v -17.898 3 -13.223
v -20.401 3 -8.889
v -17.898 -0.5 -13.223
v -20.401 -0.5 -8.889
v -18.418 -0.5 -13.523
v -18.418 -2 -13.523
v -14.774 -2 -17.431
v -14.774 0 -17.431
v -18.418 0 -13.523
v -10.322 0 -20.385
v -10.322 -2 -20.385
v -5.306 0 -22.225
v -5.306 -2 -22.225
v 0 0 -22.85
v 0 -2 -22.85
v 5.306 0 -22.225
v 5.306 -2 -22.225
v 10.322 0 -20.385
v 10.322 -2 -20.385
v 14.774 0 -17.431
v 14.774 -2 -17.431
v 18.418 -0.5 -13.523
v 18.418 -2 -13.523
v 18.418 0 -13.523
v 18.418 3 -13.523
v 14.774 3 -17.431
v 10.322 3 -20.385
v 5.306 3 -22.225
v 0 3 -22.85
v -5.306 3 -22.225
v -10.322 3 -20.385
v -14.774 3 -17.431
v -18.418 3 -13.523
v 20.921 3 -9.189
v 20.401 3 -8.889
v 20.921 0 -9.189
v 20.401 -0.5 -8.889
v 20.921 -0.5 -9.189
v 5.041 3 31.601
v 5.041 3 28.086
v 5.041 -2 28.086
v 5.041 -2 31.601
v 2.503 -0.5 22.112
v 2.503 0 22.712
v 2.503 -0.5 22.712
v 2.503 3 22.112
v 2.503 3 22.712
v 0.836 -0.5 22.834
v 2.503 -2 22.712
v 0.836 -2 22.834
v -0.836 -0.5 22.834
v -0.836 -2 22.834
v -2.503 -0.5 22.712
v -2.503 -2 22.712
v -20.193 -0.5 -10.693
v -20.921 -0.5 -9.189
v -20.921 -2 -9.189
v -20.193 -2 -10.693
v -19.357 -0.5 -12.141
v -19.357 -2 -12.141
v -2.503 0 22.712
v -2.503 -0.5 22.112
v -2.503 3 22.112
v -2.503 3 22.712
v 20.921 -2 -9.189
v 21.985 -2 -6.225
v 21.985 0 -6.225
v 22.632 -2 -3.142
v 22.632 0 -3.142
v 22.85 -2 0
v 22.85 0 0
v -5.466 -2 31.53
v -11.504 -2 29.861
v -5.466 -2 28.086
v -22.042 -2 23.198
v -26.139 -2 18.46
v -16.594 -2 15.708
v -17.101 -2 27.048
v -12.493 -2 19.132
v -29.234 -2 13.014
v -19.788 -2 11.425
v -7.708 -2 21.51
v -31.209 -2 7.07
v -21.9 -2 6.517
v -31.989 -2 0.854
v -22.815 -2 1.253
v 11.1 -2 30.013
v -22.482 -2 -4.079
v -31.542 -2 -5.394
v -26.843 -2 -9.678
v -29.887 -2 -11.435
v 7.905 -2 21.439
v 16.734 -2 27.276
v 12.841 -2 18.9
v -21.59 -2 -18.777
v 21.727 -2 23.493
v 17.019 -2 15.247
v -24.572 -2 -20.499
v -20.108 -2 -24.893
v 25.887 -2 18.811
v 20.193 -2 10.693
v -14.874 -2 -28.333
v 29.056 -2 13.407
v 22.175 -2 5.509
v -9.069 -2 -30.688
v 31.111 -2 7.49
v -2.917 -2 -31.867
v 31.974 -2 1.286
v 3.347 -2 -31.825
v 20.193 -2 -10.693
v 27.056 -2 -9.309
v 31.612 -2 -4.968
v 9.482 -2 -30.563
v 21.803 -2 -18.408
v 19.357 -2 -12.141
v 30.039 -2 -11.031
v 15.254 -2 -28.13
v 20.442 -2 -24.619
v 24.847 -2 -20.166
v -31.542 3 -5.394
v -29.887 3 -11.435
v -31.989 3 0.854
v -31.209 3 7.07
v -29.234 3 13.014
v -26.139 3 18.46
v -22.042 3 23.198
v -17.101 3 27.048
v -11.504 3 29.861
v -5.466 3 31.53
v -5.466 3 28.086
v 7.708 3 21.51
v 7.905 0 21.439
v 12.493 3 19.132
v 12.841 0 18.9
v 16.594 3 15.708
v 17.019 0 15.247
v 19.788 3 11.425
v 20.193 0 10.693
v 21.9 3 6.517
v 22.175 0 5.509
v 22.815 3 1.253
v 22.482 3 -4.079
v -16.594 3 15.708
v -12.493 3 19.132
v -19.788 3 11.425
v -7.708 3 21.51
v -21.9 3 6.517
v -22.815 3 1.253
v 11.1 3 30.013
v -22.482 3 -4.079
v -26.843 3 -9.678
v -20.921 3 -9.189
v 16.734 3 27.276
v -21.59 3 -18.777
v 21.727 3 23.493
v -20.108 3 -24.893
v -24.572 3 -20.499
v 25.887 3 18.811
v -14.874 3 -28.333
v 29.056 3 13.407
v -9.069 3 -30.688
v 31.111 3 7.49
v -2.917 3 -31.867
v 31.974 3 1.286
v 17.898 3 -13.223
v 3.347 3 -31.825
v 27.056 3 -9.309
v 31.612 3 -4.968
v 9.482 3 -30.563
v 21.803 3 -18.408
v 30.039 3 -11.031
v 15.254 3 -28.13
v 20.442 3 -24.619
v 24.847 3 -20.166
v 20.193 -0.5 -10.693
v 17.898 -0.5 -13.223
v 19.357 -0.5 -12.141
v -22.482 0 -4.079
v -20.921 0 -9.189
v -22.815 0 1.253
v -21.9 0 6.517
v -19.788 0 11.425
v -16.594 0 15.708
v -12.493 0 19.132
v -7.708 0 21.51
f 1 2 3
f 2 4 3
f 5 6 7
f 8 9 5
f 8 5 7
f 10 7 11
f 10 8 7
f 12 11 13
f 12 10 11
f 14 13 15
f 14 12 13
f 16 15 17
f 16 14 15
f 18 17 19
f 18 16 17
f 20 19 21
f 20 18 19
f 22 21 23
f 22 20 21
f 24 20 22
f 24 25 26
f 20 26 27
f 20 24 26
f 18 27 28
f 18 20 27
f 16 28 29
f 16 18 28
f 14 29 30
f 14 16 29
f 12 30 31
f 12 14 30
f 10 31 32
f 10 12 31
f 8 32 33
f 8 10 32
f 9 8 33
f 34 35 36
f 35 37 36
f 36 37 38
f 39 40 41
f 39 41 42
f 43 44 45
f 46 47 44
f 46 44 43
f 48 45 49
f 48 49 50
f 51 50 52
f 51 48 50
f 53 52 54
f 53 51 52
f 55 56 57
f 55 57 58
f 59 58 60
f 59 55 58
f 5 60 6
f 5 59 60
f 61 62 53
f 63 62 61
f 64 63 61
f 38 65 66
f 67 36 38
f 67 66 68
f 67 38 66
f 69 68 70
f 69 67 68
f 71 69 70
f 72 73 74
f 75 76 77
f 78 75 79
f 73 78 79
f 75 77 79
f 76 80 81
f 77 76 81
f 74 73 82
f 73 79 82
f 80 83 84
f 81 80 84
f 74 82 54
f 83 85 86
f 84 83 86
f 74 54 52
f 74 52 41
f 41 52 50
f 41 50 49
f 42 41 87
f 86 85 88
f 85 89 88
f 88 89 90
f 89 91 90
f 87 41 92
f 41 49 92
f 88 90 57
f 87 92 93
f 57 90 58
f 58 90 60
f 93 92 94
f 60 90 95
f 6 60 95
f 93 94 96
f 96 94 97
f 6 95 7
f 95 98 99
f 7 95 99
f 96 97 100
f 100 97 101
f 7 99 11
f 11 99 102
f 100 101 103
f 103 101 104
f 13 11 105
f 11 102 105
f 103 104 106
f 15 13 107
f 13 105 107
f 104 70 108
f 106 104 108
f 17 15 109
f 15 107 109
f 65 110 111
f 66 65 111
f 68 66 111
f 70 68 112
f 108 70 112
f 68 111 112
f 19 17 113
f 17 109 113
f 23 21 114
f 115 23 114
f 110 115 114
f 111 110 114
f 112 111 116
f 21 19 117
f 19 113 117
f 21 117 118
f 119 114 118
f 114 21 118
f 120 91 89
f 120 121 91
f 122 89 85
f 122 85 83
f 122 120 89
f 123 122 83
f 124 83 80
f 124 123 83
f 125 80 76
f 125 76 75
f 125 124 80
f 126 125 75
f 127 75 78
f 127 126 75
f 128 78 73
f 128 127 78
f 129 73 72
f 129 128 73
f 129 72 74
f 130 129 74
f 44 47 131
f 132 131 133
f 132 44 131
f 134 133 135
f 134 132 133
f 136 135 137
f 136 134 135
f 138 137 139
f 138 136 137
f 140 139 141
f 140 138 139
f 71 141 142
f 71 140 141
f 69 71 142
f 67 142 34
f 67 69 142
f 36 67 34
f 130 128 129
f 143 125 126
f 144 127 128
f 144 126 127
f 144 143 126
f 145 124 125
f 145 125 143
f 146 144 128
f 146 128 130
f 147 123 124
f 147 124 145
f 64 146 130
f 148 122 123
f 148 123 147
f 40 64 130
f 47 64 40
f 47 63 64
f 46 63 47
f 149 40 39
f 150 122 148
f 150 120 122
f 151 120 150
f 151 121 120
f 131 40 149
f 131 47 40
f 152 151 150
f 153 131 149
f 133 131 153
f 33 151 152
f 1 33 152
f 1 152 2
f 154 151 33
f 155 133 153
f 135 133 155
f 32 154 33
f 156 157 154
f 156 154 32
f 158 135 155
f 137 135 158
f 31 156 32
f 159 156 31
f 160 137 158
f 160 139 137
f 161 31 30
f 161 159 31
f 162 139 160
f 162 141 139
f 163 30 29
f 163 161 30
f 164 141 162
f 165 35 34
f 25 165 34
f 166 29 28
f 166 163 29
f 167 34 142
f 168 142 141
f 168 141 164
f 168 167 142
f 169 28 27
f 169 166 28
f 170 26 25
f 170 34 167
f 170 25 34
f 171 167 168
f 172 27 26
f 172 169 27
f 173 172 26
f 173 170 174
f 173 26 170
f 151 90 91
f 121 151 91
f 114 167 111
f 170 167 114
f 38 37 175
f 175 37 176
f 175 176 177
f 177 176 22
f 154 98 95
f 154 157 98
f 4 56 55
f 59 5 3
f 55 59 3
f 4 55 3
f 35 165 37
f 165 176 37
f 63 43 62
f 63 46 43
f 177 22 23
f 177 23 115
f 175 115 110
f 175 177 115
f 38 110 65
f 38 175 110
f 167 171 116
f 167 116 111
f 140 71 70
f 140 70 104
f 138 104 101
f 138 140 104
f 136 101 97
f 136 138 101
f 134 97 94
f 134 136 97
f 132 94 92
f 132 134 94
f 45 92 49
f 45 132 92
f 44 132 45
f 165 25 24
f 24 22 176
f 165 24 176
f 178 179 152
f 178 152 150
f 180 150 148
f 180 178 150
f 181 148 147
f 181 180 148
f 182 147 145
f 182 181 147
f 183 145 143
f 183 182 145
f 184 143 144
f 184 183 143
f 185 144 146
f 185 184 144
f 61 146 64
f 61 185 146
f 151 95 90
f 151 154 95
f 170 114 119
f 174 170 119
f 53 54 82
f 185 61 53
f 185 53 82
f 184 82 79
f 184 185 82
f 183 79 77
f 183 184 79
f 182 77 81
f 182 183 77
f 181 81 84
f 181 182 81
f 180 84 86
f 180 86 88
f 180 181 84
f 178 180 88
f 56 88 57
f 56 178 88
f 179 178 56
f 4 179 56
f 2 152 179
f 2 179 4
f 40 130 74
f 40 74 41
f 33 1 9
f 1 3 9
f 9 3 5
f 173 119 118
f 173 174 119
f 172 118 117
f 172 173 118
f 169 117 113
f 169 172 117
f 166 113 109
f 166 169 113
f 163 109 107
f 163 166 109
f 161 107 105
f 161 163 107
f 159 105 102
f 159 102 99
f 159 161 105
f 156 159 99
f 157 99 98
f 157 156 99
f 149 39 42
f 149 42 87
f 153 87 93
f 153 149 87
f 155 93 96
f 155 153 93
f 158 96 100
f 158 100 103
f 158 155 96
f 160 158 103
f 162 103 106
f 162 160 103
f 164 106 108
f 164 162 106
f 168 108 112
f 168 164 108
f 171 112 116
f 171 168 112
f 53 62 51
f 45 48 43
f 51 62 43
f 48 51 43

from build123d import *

# Parameters (mm, degrees)
BOSS_EXTRUDE4_DEPTH      = 3
BOSS_EXTRUDE5_START      = -2
BOSS_EXTRUDE5_DEPTH      = 2
BOSS_EXTRUDE6_DEPTH      = 3
BOSS_EXTRUDE6_DEPTH_BACK = 0.5


with BuildPart() as part:
    # Sketch2 → Boss-Extrude4 (new body)
    with BuildSketch(Plane(origin=(0, 0, 0), x_dir=(1, 0, 0), z_dir=(0, 1, 0))):
        with BuildLine():
            Line((-5.466491508, -31.529628456), (-5.466491508, -28.085827415))
            Line((-5.466491508, -28.085827415), (5.040547776, -28.085827415))
            Line((5.040547776, -28.085827415), (5.040547776, -31.600520219))
            ThreePointArc((5.040547776, -31.600520219), (27.604231444, -16.186611949), (30.038704969, 11.030693713))
            Line((30.038704969, 11.030693713), (27.056285781, 9.308793192))
            Line((27.056285781, 9.308793192), (21.802766139, 18.408156131))
            Line((21.802766139, 18.408156131), (24.846579394, 20.165502533))
            ThreePointArc((24.846579394, 20.165502533), (0.215901427, 31.999271657), (-24.572213461, 20.498934743))
            Line((-24.572213461, 20.498934743), (-21.589794274, 18.777034223))
            Line((-21.589794274, 18.777034223), (-26.843313916, 9.677671284))
            Line((-26.843313916, 9.677671284), (-29.887127171, 11.435017686))
            ThreePointArc((-29.887127171, 11.435017686), (-27.820132871, -15.812659708), (-5.466491508, -31.529628456))
        make_face()
        with BuildLine():
            ThreePointArc((2.502594182, -22.712052772), (0, -22.849514629), (-2.502594182, -22.712052772))
            ThreePointArc((-2.502594182, -22.712052772), (-19.788260133, -11.424757314), (-20.920511764, 9.188716249))
            ThreePointArc((-20.920511764, 9.188716249), (-19.788260133, 11.424757314), (-18.417917582, 13.523336524))
            ThreePointArc((-18.417917582, 13.523336524), (0, 22.849514629), (18.417917582, 13.523336524))
            ThreePointArc((18.417917582, 13.523336524), (19.788260133, 11.424757314), (20.920511764, 9.188716249))
            ThreePointArc((20.920511764, 9.188716249), (22.362064511, 4.69450632), (22.849514629, 0))
            ThreePointArc((22.849514629, 0), (17.018862787, -15.246593987), (2.502594182, -22.712052772))
        make_face(mode=Mode.SUBTRACT)
    extrude(amount=BOSS_EXTRUDE4_DEPTH)

    # Sketch2<12> → Boss-Extrude5 (add)
    with BuildSketch(Plane(origin=(0, 0, 0), x_dir=(1, 0, 0), z_dir=(0, 1, 0)).offset(BOSS_EXTRUDE5_START)):
        with BuildLine():
            Line((-5.466491508, -31.529628456), (-5.466491508, -28.085827415))
            Line((-5.466491508, -28.085827415), (5.040547776, -28.085827415))
            Line((5.040547776, -28.085827415), (5.040547776, -31.600520219))
            ThreePointArc((5.040547776, -31.600520219), (27.604231444, -16.186611949), (30.038704969, 11.030693713))
            Line((30.038704969, 11.030693713), (27.056285781, 9.308793192))
            Line((27.056285781, 9.308793192), (21.802766139, 18.408156131))
            Line((21.802766139, 18.408156131), (24.846579394, 20.165502533))
            ThreePointArc((24.846579394, 20.165502533), (0.215901427, 31.999271657), (-24.572213461, 20.498934743))
            Line((-24.572213461, 20.498934743), (-21.589794274, 18.777034223))
            Line((-21.589794274, 18.777034223), (-26.843313916, 9.677671284))
            Line((-26.843313916, 9.677671284), (-29.887127171, 11.435017686))
            ThreePointArc((-29.887127171, 11.435017686), (-27.820132871, -15.812659708), (-5.466491508, -31.529628456))
        make_face()
        with BuildLine():
            ThreePointArc((2.502594182, -22.712052772), (0, -22.849514629), (-2.502594182, -22.712052772))
            ThreePointArc((-2.502594182, -22.712052772), (-19.788260133, -11.424757314), (-20.920511764, 9.188716249))
            ThreePointArc((-20.920511764, 9.188716249), (-19.788260133, 11.424757314), (-18.417917582, 13.523336524))
            ThreePointArc((-18.417917582, 13.523336524), (0, 22.849514629), (18.417917582, 13.523336524))
            ThreePointArc((18.417917582, 13.523336524), (19.788260133, 11.424757314), (20.920511764, 9.188716249))
            ThreePointArc((20.920511764, 9.188716249), (22.362064511, 4.69450632), (22.849514629, 0))
            ThreePointArc((22.849514629, 0), (17.018862787, -15.246593987), (2.502594182, -22.712052772))
        make_face(mode=Mode.SUBTRACT)
    extrude(amount=BOSS_EXTRUDE5_DEPTH)

    # Sketch2<13> → Boss-Extrude6 (add, two sides: drawn at the far end of the back side and taken through both)
    with BuildSketch(Plane(origin=(0, 0, 0), x_dir=(1, 0, 0), z_dir=(0, 1, 0)).offset(-BOSS_EXTRUDE6_DEPTH_BACK)):
        with BuildLine():
            Line((2.502594182, -22.112052772), (-2.502594182, -22.112052772))
            Line((-2.502594182, -22.112052772), (-2.502594182, -22.712052772))
            ThreePointArc((-2.502594182, -22.712052772), (0, -22.849514629), (2.502594182, -22.712052772))
            Line((2.502594182, -22.712052772), (2.502594182, -22.112052772))
        make_face()
        with BuildLine():
            ThreePointArc((-18.417917582, 13.523336524), (-19.788260133, 11.424757314), (-20.920511764, 9.188716249))
            Line((-20.920511764, 9.188716249), (-20.400896522, 8.888716249))
            Line((-20.400896522, 8.888716249), (-17.89830234, 13.223336524))
            Line((-17.89830234, 13.223336524), (-18.417917582, 13.523336524))
        make_face()
        with BuildLine():
            Line((20.400896522, 8.888716249), (20.920511764, 9.188716249))
            ThreePointArc((20.920511764, 9.188716249), (19.788260133, 11.424757314), (18.417917582, 13.523336524))
            Line((18.417917582, 13.523336524), (17.89830234, 13.223336524))
            Line((17.89830234, 13.223336524), (20.400896522, 8.888716249))
        make_face()
    extrude(amount=BOSS_EXTRUDE6_DEPTH + BOSS_EXTRUDE6_DEPTH_BACK)


solid = part.part
